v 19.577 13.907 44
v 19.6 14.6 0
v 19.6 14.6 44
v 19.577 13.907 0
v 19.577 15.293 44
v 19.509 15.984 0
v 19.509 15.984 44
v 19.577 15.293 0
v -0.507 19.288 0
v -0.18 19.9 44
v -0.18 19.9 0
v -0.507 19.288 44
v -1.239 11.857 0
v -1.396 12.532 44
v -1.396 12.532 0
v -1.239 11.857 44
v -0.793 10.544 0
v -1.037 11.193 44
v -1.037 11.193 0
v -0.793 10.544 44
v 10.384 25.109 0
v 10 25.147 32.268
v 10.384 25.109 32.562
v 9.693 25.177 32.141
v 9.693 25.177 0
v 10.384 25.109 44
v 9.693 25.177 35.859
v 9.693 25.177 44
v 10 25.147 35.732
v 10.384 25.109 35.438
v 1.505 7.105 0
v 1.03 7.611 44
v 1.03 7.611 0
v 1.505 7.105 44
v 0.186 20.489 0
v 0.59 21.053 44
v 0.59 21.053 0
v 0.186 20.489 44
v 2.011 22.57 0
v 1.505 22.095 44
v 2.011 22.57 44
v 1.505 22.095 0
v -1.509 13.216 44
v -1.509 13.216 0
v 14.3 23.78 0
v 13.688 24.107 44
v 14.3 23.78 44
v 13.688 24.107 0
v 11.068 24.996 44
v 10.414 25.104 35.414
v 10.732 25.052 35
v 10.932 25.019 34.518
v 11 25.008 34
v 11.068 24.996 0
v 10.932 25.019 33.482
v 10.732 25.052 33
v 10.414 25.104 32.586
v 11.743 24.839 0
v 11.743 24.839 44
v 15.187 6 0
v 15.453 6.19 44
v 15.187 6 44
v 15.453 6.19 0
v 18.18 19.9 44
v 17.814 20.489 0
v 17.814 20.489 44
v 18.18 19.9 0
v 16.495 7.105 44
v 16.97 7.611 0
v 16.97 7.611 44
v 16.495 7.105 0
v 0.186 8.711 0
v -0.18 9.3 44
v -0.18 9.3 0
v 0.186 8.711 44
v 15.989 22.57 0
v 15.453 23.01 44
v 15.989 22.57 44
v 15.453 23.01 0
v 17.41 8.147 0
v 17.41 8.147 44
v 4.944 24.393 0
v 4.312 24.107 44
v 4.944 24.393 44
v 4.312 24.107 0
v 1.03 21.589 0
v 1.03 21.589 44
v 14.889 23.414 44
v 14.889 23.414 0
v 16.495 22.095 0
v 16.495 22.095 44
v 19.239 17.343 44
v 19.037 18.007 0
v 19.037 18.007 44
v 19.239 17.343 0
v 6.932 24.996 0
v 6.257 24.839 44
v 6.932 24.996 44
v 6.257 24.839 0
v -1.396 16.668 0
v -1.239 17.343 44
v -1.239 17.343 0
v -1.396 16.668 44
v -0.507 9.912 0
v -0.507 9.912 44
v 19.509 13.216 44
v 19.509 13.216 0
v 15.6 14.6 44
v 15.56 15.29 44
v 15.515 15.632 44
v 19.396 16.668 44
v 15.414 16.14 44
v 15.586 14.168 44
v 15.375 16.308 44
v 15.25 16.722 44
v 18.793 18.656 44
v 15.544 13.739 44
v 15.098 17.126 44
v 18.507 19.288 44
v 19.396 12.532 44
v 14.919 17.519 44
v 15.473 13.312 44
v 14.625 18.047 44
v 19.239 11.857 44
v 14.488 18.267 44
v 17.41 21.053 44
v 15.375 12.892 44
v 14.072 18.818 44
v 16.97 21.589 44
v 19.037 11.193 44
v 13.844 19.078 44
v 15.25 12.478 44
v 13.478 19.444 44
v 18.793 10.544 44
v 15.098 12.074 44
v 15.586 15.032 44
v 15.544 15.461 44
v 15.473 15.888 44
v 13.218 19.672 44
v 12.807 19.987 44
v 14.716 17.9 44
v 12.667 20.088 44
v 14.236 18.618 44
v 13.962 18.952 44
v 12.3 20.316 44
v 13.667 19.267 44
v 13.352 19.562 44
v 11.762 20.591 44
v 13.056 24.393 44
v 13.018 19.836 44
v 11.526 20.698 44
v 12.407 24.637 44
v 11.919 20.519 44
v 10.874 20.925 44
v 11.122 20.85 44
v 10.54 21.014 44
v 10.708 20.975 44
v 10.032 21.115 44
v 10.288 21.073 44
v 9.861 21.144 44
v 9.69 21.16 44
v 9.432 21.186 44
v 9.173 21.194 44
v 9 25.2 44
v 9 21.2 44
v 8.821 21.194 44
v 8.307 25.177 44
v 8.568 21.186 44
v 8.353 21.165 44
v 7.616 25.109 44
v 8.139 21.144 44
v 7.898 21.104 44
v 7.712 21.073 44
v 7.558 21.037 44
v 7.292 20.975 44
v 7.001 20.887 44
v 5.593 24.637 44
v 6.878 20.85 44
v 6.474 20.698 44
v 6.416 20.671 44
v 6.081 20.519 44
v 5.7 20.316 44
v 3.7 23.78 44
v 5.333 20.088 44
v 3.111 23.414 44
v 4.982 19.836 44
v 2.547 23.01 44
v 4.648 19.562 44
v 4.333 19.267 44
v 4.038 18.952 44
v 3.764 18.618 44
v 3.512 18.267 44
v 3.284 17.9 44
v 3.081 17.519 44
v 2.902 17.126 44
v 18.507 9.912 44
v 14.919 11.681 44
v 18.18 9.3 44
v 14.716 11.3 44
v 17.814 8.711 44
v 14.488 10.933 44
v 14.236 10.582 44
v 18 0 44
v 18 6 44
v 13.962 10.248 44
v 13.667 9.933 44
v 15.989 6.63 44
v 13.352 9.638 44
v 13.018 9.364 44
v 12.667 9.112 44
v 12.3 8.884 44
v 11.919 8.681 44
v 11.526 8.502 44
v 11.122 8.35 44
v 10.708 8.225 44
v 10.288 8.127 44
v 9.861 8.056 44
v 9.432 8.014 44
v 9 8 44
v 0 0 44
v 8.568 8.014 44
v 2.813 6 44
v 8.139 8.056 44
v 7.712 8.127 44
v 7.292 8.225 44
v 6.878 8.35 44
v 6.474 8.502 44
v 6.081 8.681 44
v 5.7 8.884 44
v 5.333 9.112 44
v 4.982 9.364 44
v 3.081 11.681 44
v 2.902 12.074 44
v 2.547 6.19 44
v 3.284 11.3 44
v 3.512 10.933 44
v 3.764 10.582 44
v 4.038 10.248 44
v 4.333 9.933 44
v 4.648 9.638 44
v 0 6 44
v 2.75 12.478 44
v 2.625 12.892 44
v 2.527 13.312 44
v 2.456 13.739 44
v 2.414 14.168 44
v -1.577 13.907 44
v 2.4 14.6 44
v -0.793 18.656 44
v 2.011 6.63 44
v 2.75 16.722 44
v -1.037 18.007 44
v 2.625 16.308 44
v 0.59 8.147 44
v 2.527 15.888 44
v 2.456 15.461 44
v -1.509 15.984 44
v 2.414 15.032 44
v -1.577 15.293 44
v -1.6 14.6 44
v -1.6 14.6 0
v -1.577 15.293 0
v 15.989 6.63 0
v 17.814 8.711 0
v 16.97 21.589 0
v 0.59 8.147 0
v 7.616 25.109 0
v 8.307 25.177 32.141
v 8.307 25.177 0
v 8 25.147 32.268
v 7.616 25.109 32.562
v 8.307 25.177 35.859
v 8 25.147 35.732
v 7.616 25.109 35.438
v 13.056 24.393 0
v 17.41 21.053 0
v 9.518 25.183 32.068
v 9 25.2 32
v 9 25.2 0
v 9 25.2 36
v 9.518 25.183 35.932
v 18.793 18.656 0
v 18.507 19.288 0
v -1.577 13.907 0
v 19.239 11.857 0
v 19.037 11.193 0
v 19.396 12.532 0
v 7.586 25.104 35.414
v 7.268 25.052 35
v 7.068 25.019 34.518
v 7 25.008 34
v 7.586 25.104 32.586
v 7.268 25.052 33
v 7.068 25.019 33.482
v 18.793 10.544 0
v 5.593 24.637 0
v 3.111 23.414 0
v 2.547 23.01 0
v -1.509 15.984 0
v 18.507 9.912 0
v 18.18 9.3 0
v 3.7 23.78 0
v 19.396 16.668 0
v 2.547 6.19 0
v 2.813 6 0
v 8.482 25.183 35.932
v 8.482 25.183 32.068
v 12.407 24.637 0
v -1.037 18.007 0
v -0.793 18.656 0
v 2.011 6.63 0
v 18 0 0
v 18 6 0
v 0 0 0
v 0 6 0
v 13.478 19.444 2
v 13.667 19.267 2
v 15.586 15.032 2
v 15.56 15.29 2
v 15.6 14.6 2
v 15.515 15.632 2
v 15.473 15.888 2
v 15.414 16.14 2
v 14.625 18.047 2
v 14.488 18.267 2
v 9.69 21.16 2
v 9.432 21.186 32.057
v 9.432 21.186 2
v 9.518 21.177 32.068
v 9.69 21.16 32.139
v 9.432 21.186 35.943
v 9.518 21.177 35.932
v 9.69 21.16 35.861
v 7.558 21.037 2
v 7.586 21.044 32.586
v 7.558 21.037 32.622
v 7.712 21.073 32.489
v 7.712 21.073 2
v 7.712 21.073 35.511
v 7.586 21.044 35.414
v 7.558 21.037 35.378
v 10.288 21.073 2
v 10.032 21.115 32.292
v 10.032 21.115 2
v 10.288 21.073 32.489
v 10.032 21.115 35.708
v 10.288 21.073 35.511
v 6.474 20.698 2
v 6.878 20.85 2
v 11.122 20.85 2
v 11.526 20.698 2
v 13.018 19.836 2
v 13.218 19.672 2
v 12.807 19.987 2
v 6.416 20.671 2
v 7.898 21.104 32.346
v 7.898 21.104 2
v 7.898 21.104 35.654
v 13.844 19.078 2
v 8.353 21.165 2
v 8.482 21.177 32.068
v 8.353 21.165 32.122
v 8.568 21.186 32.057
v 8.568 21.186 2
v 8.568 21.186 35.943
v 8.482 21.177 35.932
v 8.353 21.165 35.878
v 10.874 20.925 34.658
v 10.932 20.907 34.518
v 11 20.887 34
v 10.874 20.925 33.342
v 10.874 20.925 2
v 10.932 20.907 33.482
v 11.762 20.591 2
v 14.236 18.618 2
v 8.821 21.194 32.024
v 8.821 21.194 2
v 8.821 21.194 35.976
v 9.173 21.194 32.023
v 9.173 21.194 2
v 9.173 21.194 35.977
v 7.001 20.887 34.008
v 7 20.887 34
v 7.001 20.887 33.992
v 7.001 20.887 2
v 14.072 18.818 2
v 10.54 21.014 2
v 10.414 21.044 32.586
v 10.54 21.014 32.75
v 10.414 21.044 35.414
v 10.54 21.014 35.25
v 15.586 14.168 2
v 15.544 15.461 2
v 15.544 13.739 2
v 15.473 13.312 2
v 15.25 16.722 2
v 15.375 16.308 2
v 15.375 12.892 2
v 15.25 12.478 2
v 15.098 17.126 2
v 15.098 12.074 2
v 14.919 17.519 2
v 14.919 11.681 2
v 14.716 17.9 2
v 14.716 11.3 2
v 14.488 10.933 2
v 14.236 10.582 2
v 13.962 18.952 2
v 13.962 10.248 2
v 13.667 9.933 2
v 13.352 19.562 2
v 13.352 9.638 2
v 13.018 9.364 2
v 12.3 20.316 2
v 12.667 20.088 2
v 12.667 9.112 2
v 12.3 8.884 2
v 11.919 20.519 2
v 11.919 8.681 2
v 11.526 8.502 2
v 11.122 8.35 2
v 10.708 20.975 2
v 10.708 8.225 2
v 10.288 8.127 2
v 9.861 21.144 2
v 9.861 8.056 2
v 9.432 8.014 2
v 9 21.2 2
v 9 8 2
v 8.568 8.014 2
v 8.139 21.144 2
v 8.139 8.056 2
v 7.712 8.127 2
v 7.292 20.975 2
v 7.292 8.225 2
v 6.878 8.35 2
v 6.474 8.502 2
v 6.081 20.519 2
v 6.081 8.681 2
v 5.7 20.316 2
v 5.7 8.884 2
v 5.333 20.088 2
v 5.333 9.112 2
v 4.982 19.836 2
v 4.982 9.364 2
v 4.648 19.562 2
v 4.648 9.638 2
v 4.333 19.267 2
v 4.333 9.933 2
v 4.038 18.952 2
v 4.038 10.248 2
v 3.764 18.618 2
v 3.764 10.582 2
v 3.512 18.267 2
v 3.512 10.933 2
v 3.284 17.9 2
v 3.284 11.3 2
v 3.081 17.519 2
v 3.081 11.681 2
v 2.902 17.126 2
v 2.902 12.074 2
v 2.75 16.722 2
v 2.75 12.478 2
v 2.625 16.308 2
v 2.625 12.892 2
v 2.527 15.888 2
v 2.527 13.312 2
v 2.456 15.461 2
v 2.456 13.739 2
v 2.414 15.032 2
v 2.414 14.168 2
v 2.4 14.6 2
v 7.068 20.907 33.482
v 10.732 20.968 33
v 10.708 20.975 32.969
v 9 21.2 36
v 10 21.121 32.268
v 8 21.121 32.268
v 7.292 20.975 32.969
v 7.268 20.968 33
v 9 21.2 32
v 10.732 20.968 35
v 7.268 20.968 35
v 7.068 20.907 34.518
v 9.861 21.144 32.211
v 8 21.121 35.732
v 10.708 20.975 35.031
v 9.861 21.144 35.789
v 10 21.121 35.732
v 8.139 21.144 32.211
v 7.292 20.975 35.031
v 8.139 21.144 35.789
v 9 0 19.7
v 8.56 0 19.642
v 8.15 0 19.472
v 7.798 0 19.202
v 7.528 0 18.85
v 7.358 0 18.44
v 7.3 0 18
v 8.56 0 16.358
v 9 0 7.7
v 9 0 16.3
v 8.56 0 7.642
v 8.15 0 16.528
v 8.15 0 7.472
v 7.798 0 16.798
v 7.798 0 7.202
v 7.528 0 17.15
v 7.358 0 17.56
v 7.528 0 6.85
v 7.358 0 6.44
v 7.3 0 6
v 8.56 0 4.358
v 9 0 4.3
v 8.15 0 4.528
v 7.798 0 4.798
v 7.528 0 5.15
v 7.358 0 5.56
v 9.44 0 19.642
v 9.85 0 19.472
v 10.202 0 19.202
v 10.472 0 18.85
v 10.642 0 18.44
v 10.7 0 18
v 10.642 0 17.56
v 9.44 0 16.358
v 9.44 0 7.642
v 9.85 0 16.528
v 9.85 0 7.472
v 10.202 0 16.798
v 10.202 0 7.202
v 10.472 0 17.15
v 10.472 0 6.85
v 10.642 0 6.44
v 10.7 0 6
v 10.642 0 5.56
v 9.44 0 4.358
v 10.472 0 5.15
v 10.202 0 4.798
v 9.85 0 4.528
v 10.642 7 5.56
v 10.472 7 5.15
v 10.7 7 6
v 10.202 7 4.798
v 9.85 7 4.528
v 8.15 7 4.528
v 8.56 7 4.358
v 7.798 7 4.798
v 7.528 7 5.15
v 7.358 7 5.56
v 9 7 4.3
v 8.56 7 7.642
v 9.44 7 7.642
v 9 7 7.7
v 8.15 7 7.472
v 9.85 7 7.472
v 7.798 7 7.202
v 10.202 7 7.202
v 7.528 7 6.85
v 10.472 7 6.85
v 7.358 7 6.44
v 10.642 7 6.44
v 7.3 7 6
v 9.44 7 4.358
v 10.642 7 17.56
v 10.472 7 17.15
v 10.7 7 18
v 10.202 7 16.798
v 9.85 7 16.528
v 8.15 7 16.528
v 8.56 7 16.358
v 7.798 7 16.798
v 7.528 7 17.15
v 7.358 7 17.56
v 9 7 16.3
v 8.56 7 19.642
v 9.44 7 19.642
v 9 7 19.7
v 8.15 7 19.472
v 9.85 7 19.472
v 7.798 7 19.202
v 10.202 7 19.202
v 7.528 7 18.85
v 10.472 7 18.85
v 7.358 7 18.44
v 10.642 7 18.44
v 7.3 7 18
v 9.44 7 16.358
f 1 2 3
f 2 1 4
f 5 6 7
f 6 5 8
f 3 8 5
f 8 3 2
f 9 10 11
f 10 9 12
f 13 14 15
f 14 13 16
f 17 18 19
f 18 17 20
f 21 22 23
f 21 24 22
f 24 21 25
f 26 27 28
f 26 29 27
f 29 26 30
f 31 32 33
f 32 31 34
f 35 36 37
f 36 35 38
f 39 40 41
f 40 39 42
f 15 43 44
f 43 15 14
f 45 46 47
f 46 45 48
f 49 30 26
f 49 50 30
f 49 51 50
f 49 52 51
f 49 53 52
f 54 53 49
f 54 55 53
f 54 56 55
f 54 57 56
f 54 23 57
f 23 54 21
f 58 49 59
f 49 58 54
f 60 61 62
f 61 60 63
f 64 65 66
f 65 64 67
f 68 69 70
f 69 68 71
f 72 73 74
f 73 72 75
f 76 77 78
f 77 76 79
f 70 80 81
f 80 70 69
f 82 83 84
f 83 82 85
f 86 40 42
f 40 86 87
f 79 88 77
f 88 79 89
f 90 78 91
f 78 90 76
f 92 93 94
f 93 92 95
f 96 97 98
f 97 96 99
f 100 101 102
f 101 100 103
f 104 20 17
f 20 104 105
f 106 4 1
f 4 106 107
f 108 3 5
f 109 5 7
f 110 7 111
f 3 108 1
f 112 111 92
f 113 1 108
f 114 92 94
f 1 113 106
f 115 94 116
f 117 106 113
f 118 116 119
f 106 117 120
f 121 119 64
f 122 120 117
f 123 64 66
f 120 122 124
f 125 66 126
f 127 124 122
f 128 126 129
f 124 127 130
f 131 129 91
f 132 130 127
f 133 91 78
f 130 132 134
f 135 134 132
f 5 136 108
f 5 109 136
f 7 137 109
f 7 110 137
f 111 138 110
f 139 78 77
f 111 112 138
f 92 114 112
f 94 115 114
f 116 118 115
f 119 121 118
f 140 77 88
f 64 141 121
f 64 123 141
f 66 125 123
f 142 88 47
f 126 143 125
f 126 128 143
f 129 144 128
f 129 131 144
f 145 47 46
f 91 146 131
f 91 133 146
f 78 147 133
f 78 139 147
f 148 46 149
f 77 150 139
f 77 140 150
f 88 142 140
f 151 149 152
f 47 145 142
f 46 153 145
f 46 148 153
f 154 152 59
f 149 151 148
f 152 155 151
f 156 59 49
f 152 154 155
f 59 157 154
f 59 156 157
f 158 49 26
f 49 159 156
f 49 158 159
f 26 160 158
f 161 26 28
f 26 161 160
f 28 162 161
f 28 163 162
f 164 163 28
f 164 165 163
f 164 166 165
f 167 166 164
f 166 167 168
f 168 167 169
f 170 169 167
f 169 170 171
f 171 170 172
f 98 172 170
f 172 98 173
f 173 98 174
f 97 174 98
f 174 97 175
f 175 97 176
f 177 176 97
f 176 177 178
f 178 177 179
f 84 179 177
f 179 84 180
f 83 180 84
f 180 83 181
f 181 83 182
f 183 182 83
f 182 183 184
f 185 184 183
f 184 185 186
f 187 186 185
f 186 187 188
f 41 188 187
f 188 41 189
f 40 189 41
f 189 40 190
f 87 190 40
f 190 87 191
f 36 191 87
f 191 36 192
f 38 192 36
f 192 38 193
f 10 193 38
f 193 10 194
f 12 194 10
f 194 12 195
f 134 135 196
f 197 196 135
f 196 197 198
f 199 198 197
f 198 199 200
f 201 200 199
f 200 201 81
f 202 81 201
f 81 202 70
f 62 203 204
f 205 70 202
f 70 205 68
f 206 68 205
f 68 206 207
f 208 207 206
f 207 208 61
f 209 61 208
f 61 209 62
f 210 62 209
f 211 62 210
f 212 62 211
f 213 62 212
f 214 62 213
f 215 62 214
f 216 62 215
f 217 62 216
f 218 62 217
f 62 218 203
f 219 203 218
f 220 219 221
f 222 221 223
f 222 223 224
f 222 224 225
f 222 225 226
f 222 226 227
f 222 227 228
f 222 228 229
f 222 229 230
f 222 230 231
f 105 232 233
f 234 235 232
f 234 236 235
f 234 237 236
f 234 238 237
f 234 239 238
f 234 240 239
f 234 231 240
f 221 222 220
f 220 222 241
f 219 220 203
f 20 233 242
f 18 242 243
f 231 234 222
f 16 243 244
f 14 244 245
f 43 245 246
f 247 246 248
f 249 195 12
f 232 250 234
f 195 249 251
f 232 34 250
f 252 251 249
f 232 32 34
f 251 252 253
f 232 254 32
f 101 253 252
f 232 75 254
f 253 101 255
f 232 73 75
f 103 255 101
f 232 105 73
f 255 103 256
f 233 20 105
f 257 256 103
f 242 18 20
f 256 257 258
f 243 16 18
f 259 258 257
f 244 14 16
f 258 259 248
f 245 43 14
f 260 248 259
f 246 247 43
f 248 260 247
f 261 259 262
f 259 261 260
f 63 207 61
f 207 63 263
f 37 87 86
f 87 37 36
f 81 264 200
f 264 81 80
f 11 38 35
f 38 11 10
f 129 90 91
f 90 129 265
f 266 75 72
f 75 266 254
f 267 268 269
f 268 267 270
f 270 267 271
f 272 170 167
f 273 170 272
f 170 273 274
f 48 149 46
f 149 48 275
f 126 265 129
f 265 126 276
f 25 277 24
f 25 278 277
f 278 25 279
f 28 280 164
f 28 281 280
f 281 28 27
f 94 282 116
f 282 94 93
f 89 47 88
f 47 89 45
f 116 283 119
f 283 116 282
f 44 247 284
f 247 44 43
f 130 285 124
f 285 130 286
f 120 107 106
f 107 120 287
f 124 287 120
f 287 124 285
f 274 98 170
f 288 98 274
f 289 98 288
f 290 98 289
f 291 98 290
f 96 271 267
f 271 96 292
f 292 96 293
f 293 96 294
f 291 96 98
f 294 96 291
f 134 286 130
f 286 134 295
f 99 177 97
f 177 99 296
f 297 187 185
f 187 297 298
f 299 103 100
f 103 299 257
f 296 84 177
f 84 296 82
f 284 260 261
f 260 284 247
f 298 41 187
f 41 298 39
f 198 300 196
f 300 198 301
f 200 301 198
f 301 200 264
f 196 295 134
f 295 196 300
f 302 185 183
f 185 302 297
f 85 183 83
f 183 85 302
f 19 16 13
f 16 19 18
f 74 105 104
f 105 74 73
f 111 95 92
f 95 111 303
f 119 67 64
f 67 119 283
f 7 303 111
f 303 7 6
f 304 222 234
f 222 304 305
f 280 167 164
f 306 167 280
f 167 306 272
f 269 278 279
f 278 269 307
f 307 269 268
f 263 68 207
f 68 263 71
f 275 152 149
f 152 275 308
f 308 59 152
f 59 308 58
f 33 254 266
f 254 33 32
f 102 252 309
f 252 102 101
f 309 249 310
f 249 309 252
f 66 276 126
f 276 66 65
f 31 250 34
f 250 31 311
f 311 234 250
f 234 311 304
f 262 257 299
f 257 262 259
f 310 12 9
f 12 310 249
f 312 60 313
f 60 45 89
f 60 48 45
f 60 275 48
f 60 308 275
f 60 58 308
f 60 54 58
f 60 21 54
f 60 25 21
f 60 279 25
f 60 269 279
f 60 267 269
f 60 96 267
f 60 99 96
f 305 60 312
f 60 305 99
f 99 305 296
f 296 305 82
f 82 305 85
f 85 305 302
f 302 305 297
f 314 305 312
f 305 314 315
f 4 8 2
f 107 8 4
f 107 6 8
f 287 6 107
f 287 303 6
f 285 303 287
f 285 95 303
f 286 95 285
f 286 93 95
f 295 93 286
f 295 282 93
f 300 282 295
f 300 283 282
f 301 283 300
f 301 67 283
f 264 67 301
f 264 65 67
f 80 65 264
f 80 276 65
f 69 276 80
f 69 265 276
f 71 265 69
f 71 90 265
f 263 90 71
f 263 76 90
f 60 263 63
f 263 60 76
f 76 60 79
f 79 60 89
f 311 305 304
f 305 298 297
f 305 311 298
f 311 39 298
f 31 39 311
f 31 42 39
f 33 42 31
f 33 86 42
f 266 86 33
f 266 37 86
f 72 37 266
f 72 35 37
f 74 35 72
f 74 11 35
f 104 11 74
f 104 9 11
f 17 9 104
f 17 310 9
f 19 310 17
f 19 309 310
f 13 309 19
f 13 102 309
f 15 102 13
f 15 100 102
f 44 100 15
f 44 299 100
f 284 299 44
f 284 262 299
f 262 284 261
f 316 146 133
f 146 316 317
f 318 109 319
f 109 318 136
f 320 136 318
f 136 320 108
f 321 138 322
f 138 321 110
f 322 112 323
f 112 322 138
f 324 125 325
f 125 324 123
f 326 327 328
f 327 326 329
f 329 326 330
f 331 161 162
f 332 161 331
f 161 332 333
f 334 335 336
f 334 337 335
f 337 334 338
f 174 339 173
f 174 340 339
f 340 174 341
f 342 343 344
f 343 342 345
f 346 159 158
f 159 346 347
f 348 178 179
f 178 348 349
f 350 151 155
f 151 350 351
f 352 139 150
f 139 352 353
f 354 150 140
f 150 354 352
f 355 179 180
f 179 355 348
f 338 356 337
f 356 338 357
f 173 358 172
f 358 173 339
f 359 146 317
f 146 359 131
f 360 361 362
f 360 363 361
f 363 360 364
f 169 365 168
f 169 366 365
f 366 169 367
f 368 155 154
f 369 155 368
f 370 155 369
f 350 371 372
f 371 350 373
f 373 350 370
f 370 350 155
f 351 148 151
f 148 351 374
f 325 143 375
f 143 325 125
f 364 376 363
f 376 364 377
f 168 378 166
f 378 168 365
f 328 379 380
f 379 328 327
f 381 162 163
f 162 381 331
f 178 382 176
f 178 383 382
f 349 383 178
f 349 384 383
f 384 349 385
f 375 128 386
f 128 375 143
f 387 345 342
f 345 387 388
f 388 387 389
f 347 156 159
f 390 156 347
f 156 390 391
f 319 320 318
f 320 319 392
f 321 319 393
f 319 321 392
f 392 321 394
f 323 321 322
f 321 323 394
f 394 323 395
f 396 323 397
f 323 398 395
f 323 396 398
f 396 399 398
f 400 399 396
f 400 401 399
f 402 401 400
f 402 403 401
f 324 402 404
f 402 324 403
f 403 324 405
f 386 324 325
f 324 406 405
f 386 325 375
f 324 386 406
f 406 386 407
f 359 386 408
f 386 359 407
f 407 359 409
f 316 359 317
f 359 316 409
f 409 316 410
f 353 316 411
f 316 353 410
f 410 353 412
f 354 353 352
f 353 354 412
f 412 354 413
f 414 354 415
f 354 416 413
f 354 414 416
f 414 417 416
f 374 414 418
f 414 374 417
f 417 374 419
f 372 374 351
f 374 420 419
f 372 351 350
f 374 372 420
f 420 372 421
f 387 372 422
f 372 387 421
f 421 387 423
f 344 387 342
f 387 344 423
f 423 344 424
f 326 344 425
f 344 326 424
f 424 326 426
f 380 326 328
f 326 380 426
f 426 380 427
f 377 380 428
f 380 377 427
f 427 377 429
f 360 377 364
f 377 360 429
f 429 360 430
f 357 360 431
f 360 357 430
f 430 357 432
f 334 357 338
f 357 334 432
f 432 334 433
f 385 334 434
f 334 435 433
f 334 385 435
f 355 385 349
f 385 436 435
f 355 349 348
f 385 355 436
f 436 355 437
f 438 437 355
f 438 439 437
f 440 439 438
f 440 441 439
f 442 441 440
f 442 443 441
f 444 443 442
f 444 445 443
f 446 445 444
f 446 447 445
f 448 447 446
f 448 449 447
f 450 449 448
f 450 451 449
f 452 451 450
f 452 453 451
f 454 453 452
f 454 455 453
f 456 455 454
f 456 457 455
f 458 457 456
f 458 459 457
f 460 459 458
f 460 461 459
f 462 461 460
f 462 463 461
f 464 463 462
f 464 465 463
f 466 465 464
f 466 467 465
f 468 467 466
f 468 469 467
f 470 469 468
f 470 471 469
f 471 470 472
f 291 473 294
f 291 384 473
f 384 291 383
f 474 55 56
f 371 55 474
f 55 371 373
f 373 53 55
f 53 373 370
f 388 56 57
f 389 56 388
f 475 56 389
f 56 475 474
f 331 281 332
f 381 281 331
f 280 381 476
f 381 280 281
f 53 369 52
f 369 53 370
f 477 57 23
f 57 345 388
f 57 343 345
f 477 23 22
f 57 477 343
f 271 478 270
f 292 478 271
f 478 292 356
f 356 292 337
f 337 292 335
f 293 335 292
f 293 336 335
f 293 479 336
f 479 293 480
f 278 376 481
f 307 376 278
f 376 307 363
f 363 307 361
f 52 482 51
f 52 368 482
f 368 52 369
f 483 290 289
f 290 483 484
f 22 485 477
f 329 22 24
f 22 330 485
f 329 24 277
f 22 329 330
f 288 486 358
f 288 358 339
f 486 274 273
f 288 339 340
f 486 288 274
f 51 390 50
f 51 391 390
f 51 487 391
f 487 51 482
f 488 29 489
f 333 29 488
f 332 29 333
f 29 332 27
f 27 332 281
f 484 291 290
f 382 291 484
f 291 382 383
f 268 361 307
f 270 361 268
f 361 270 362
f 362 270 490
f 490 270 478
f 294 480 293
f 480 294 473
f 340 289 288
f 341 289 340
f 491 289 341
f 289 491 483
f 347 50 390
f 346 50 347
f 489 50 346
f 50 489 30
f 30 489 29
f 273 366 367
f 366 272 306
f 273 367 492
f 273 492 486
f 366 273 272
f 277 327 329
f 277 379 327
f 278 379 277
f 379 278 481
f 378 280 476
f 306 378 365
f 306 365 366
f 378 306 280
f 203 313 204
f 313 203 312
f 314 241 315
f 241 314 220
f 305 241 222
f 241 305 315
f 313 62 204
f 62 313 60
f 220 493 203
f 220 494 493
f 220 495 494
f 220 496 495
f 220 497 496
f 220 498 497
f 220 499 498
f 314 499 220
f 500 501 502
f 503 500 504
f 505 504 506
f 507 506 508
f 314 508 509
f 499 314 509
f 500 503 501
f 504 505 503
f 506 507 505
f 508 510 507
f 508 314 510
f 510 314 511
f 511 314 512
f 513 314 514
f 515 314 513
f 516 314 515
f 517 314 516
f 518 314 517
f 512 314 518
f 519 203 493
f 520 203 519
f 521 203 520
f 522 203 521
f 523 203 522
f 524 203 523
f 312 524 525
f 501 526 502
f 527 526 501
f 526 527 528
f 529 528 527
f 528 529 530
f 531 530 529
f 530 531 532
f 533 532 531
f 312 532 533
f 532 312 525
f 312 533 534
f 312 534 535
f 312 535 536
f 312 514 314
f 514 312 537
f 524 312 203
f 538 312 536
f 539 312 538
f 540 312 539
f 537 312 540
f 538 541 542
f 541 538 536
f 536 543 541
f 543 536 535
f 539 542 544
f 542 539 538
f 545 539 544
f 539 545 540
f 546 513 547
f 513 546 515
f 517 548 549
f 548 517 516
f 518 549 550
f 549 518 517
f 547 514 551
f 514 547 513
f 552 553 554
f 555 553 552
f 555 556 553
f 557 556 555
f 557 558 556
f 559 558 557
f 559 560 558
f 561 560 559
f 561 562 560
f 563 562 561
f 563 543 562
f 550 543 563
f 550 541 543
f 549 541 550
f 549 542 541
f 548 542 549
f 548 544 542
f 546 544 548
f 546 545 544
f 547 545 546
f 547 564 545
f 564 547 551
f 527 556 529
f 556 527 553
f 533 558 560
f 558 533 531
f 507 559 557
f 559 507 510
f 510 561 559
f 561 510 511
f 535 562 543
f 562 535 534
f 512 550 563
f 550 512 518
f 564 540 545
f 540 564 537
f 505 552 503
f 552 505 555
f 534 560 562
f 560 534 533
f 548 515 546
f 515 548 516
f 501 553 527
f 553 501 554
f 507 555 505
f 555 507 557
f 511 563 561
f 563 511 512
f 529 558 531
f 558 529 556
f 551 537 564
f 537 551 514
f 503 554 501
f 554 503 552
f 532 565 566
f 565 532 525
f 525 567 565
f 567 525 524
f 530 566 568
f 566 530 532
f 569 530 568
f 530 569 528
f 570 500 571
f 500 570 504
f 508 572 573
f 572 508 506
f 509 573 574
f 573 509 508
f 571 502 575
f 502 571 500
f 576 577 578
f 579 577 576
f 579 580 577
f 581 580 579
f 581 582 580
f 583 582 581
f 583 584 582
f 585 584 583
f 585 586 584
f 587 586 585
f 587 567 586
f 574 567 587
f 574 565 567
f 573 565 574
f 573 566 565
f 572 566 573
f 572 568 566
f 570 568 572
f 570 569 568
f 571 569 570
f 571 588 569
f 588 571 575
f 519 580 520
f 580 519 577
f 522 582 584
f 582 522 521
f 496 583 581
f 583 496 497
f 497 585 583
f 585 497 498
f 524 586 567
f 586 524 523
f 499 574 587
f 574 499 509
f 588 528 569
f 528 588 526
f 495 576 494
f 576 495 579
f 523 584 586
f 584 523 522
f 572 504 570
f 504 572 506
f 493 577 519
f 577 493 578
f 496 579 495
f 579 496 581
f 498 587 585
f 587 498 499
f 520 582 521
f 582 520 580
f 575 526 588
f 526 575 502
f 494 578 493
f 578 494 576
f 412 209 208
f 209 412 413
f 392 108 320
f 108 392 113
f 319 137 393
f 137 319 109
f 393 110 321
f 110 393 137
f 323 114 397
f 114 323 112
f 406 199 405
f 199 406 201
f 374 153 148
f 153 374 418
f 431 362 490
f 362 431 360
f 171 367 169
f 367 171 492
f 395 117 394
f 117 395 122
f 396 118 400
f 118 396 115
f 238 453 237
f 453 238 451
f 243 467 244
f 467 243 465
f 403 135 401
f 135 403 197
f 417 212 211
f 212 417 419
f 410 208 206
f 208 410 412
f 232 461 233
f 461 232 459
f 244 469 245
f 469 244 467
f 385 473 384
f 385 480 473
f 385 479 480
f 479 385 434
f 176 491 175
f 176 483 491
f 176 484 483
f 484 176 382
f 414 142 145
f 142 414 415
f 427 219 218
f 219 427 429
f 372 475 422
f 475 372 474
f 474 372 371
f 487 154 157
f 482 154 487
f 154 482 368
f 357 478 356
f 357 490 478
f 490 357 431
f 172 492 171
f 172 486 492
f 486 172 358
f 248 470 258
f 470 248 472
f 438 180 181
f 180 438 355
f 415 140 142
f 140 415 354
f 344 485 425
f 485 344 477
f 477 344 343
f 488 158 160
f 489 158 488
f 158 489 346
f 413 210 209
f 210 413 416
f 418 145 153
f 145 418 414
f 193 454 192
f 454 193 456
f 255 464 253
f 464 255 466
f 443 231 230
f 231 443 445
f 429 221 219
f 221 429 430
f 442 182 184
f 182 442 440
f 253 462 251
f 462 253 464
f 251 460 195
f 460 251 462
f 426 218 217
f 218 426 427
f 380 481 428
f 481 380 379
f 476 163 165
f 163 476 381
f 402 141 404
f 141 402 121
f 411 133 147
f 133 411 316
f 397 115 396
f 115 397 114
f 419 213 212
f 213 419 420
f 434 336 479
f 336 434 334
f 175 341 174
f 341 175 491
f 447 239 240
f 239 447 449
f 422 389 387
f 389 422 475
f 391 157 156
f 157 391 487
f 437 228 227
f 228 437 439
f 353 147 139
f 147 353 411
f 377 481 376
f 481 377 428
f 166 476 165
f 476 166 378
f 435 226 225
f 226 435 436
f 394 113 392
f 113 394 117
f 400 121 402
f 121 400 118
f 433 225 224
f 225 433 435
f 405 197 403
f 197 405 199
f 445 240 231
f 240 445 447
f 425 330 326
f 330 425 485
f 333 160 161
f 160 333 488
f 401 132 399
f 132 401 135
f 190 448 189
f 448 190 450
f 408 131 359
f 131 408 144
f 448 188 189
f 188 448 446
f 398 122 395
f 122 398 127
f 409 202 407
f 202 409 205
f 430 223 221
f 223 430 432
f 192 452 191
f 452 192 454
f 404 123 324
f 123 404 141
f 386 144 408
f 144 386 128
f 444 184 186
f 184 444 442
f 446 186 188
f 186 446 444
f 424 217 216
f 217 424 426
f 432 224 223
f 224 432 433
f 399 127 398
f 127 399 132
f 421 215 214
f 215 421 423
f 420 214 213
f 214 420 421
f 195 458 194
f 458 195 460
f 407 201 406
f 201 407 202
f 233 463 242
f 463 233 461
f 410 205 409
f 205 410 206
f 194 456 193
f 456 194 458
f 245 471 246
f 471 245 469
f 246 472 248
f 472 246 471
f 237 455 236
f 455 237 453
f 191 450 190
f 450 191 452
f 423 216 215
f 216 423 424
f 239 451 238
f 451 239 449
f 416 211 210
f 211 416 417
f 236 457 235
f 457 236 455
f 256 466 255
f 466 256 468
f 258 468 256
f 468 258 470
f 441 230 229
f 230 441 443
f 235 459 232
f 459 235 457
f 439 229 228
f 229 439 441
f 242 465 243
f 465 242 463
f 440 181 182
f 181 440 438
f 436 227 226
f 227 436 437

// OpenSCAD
// file: layout.scad
// GENERATED by cad/fit.py from cad/ordered_parts.toml and config.scad.
// Do not edit: change those and run  python3 cad/fit.py  (from sport_cam/).

base_d = 141;
base_h = 84;
window_z = 36.5;
shelf_z = 48.5;
shelf_r = 66.75;
gap_ang = 300;
gap_d = 22;
post_r = 63.5;
post_angs = [15, 100, 225];
window_ribs = [15, 35, 55, 75, 95, 115, 135, 155, 175, 195, 215, 235, 255, 275, 295, 315, 335, 355];
pi_holes = [[-36.525, -40.718], [13.704, -11.718], [-61.025, 1.718], [-10.796, 30.718]];
pi_hole_d = 2.9;
usbc_ang = 150;
usbc_z = 8.35;
usbc_w = 13.5;
usbc_h = 8;
jack_ang = 210;
jack_z = 9.5;
jack_d = 8.2;
switch_ang = 120;
switch_z = 11.5;
switch_cut_w = 19.2;
switch_cut_h = 13.2;
switch_panel_t = 2;
vents_low = [5, 25, 45, 65, 245, 305, 325, 345];
vent_low_z = 9;
vents_high = [5, 65, 85, 105, 165, 185, 205, 245, 265, 285, 345];
vent_high_z = 64.75;
lid_screw_angs = [45, 135, 225, 315];
lid_screw_z = 81;
lid_nut_recess = 0.7;
ptz_nut_af = 5.5;
ptz_slot_min = 30;
ptz_slot_max = 72;
risers = [];
insert_od = 12.7;
insert_l = 8;
bank_l = 150;
bank_w = 72;
bank_h = 30;
uwb_l = 40;
uwb_w = 25;
uwb_hole_dx = 32;
uwb_hole_dy = 17;
ula1_tangential = true;
mast_d = 12.7;
pod_inner_l = 138;
pod_inner_w = 27;
pod_inner_h = 25;
pod_ula1_x0 = 98;
pod_charge_slot = true;
usb_entry_ang = 25;
usb_entry_z = 71;
usb_entry_w = 18;
usb_entry_h = 10;
// file: config.scad
// SportCam — parametric dimensions (mm). Every part file includes this.
//
// Three kinds of number feed the CAD:
//   * design choices — wall thickness, clearances, the anchor baseline — set below;
//   * the sizes of the parts you buy — in ../../cad/ordered_parts.toml;
//   * the layout — where each board sits, which way the Pi faces, how big
//     the enclosure is — which ../../cad/fit.py solves from the other two
//     and writes to layout.scad (included half-way down).
// After changing either file run   python3 cad/fit.py   from sport_cam/.
// It re-solves the layout, re-renders the STLs and audits that every part
// fits together and prints on a Bambu Lab A1 Mini (cad/FIT_REPORT.md).
//
// Keep the numbers above the include plain numbers (fit.py reads them);
// anything worked out from the layout goes below it.
//
// This is the **PTZ-base build**: the camera, pan and tilt all come from the
// Arducam IMX477 PTZ camera with metal pan-tilt base (B0167B12), which bolts
// to the lid of a static enclosure — see docs/design/03-mechanical-design.md.

$fn = 96;
clr = 0.25;                    // general printed-fit clearance per side

// ---- enclosure -------------------------------------------------------------
// Bottom to top: the power boards stuck to the floor; the LED ring under a
// printed shelf, shining out through the LED window; the Raspberry Pi on the
// shelf; the lid with the camera. Every part must print in one piece on a
// Bambu Lab A1 Mini (≤ 170 mm on every axis); fit.py keeps it that way.
base_d_min    = 135;           // narrowest enclosure (outer Ø); fit.py widens it only if the parts need it
base_h_min    = 66;            // lowest floor-to-lid height; fit.py raises it to clear the stack
base_wall     = 3;
lid_t         = 5;             // lid is structural: it carries the whole camera
spigot_h      = 6;             // locating ring under the lid that drops into the mouth
spigot_w      = 3;
lid_screw_pad = 7;             // the ring is thickened here for the four radial M3 inserts
lid_screw_d   = 3.4;
led_window_h  = 12;            // circumferential window the LED ring lights
window_bridge = 22;            // longest unsupported span over the window; ribs every this far
window_rib_w  = 3;
diffuser_t    = 1.6;           // translucent band slid over the outside of the window
diffuser_lip  = 2;             // how far it overlaps the wall above and below
ledge_h       = 2;             // the band rests on this outside ledge

tripod_boss_d = 24;            // floor boss for the 3/8-16 insert (bore from ordered_parts.toml)
tripod_boss_h = 8;

tape_t        = 1;             // foam tape under the power boards and the LED ring
part_gap      = 2;             // clearance fit.py keeps between parts
wall_gap      = 1;             // and between a part and the wall
shelf_t       = 3;             // the Pi shelf
post_d        = 10;            // shelf posts, merged into the wall; M3 insert in each top
post_insert_d = 4.0;
vent_w        = 4;
vent_h        = 8;
ribbon_slack_h = 8;            // clear height kept under the lid opening for the coiled camera ribbon

// ---- Arducam pan-tilt base interface ---------------------------------------
// Arducam publishes no drawing for the B0167B12 metal base and the footprint
// has changed between revisions, so the lid is cut with radial SLOTS spanning
// this range. Your base's spacing goes in ordered_parts.toml [ptz]; the audit
// checks it lands inside.
ptz_bolt_min  = 30;
ptz_bolt_max  = 72;
ptz_slot_w    = 3.4;           // M3 clearance
ptz_cable_d   = 34;            // central opening: CSI ribbon + servo leads drop through

// ---- UWB anchor arms (static) ----------------------------------------------
// The anchors don't rotate with the camera, so the arms bolt to the enclosure
// wall. Board centres land `uwb_half_base` either side of the pan axis; the
// tracker subtracts the commanded pan angle (docs/04).
uwb_half_base = 125;           // half the baseline → 250 mm anchor separation
arm_w = 18; arm_t = 8;
arm_root_h = 24;               // bracket height where the arm meets the wall
arm_boss_z = 10;               // bottom of the wall bosses
arm_insert_d = 4.0;            // M3 heat-set inserts in the bosses
ula1_standoff_h = 3;

// ---- third anchor mast (A3) ------------------------------------------------
// A3 gives elevation, which the horizontal A1-A2 bar cannot. It stands on a
// bought ½-inch hardwood dowel held in a printed foot on a third wall boss at
// −X — directly behind the lens, where pan (±80°) never points it — with a
// printed cradle carrying the board at the top. Wood, not metal: a metal
// tube right under a UWB antenna detunes it.
anchor_board_z = 22;           // A1/A2 board height above the enclosure floor
uwb_v_base  = 250;             // A3 board this far above A1/A2 (= σφ baseline)
mast_wall   = 4;               // socket wall
mast_floor  = 2;               // closed socket bottom; sets the dowel's height
mast_foot_h = 44;              // foot socket depth: long, so the mast stands still
mast_cap_h  = 30;              // cradle socket depth

// ---- battery tray ----------------------------------------------------------
// Sized to the power bank in ordered_parts.toml. Straps to a tripod leg or
// centre column, or sandwiches under the enclosure on a long 1/4-20.
tray_wall = 2.4;
tray_lip = 10;                 // how far the side walls come up the bank
tray_strap_w = 26;             // hook-and-loop strap slots

// ---- wearable pod ----------------------------------------------------------
// The tag is a ULA1 plugged straight into a slim USB bank, end to end; fit.py
// sizes the pod from both (ordered_parts.toml).
pod_wall = 2.0;
strap_w = 26;                  // elastic armband width
pod_max_l = 150;               // longest pod that's still comfortable on an arm

// ---- solved layout ---------------------------------------------------------
include <layout.scad>          // GENERATED by cad/fit.py — bought-part sizes + layout

R_in = base_d / 2 - base_wall; // inside of the wall
tripod_hole_d = insert_od;     // the 3/8-16 insert, epoxied: a snug slip fit

arm_boss_r = base_d / 2 + 4;   // outer face of the wall boss the arm bolts to
arm_len = uwb_half_base - arm_boss_r;             // boss face to board centre

// ULA1 pad. fit.py turns the boards across the arms (plug towards −X) when
// the extension cable's socket end has no room between the plug and the
// enclosure; the pad and holes follow.
pad_along   = ula1_tangential ? uwb_w + 12 : uwb_l + 12;
pad_across  = ula1_tangential ? uwb_l : uwb_w;
hole_along  = ula1_tangential ? uwb_hole_dy : uwb_hole_dx;
hole_across = ula1_tangential ? uwb_hole_dx : uwb_hole_dy;

mast_bore   = mast_d + 2 * clr;
mast_sock_r = mast_bore / 2 + mast_wall;
// mast axis from the pan axis: boss face, 6 mm root plate, socket, 2 mm overlap.
// fit.py keeps device/sportcam/config.py UWB_A3_BACK_M in step.
mast_axis_r = arm_boss_r + 6 + mast_sock_r - 2;
// The cradle puts the board mast_floor + arm_t + 4 above the dowel top
// (socket floor, pad, standoffs), and the foot's floor sits on the boss at
// z = arm_boss_z, so cut the dowel to this:
cradle_rise  = mast_floor + arm_t + 4;
mast_dowel_l = anchor_board_z + uwb_v_base - cradle_rise - (arm_boss_z + mast_floor);
// main file
// Third UWB anchor (A3) mast — two printed parts around a bought ½" dowel.
//
//   part = "foot"    bolts to the −X wall boss, holds the dowel upright
//   part = "cradle"  caps the dowel and carries the ULA1 flat, like A1/A2
//
// render_all.sh renders both with -D part=... . The dowel is cut to
// mast_dowel_l (echoed below), which lands A3 uwb_v_base above A1/A2.
//
// Both print with the socket opening UP, no supports. 4+ walls: the foot
// takes the whole mast's leverage through two M3s. One M3 heat-set insert in
// each socket wall takes a thumb screw that pinches the dowel.
include <config.scad>

part = "foot";
echo(str("cut the dowel to ", mast_dowel_l, " mm; mast axis ", mast_axis_r,
         " mm behind the pan axis"));

module socket(h) {
    // open-topped tube with a closed floor and a pinch-screw insert
    difference() {
        cylinder(r = mast_sock_r, h = h);
        translate([0, 0, mast_floor]) cylinder(d = mast_bore, h = h);
        translate([0, 0, h - 10]) rotate([-90, 0, 0])
            cylinder(d = arm_insert_d, h = mast_sock_r + 1, $fn = 24);
    }
}

// Root plate as on the arms, but full socket height for stiffness: above the
// boss it stands clear of the curved wall, so it can be taller than the boss.
module mast_foot() {
    sy = 6 + mast_sock_r - 2;          // socket centre from the plate's back face
    difference() {
        union() {
            cube([arm_w, 6, mast_foot_h]);
            translate([arm_w / 2, sy, 0]) socket(mast_foot_h);
        }
        translate([arm_w / 2, sy, mast_floor]) cylinder(d = mast_bore, h = mast_foot_h);
        for (z = [6, 18])
            translate([arm_w / 2, -1, z]) rotate([-90, 0, 0])
                cylinder(d = 3.4, h = 8, $fn = 24);
    }
}

// Printed pad-down; mounted, it is flipped so the board faces up.
cr_x  = ula1_tangential ? uwb_l + 12 : uwb_w;
cr_y  = ula1_tangential ? uwb_w : uwb_l + 12;
cr_hx = ula1_tangential ? uwb_hole_dx : uwb_hole_dy;
cr_hy = ula1_tangential ? uwb_hole_dy : uwb_hole_dx;
module mast_cradle() {
    difference() {
        union() {
            // pad: the board lies the same way as A1/A2 — long side along X
            // when fit.py turns them across the arms, along Y otherwise
            translate([-cr_x / 2, -cr_y / 2, 0]) cube([cr_x, cr_y, arm_t]);
            translate([0, 0, arm_t]) socket(mast_cap_h);
        }
        for (x = [-1, 1], y = [-1, 1])
            translate([x * cr_hx / 2, y * cr_hy / 2, -1])
                cylinder(d = 2.2, h = arm_t + 2, $fn = 24);
    }
}

if (part == "foot") mast_foot();
else mast_cradle();
